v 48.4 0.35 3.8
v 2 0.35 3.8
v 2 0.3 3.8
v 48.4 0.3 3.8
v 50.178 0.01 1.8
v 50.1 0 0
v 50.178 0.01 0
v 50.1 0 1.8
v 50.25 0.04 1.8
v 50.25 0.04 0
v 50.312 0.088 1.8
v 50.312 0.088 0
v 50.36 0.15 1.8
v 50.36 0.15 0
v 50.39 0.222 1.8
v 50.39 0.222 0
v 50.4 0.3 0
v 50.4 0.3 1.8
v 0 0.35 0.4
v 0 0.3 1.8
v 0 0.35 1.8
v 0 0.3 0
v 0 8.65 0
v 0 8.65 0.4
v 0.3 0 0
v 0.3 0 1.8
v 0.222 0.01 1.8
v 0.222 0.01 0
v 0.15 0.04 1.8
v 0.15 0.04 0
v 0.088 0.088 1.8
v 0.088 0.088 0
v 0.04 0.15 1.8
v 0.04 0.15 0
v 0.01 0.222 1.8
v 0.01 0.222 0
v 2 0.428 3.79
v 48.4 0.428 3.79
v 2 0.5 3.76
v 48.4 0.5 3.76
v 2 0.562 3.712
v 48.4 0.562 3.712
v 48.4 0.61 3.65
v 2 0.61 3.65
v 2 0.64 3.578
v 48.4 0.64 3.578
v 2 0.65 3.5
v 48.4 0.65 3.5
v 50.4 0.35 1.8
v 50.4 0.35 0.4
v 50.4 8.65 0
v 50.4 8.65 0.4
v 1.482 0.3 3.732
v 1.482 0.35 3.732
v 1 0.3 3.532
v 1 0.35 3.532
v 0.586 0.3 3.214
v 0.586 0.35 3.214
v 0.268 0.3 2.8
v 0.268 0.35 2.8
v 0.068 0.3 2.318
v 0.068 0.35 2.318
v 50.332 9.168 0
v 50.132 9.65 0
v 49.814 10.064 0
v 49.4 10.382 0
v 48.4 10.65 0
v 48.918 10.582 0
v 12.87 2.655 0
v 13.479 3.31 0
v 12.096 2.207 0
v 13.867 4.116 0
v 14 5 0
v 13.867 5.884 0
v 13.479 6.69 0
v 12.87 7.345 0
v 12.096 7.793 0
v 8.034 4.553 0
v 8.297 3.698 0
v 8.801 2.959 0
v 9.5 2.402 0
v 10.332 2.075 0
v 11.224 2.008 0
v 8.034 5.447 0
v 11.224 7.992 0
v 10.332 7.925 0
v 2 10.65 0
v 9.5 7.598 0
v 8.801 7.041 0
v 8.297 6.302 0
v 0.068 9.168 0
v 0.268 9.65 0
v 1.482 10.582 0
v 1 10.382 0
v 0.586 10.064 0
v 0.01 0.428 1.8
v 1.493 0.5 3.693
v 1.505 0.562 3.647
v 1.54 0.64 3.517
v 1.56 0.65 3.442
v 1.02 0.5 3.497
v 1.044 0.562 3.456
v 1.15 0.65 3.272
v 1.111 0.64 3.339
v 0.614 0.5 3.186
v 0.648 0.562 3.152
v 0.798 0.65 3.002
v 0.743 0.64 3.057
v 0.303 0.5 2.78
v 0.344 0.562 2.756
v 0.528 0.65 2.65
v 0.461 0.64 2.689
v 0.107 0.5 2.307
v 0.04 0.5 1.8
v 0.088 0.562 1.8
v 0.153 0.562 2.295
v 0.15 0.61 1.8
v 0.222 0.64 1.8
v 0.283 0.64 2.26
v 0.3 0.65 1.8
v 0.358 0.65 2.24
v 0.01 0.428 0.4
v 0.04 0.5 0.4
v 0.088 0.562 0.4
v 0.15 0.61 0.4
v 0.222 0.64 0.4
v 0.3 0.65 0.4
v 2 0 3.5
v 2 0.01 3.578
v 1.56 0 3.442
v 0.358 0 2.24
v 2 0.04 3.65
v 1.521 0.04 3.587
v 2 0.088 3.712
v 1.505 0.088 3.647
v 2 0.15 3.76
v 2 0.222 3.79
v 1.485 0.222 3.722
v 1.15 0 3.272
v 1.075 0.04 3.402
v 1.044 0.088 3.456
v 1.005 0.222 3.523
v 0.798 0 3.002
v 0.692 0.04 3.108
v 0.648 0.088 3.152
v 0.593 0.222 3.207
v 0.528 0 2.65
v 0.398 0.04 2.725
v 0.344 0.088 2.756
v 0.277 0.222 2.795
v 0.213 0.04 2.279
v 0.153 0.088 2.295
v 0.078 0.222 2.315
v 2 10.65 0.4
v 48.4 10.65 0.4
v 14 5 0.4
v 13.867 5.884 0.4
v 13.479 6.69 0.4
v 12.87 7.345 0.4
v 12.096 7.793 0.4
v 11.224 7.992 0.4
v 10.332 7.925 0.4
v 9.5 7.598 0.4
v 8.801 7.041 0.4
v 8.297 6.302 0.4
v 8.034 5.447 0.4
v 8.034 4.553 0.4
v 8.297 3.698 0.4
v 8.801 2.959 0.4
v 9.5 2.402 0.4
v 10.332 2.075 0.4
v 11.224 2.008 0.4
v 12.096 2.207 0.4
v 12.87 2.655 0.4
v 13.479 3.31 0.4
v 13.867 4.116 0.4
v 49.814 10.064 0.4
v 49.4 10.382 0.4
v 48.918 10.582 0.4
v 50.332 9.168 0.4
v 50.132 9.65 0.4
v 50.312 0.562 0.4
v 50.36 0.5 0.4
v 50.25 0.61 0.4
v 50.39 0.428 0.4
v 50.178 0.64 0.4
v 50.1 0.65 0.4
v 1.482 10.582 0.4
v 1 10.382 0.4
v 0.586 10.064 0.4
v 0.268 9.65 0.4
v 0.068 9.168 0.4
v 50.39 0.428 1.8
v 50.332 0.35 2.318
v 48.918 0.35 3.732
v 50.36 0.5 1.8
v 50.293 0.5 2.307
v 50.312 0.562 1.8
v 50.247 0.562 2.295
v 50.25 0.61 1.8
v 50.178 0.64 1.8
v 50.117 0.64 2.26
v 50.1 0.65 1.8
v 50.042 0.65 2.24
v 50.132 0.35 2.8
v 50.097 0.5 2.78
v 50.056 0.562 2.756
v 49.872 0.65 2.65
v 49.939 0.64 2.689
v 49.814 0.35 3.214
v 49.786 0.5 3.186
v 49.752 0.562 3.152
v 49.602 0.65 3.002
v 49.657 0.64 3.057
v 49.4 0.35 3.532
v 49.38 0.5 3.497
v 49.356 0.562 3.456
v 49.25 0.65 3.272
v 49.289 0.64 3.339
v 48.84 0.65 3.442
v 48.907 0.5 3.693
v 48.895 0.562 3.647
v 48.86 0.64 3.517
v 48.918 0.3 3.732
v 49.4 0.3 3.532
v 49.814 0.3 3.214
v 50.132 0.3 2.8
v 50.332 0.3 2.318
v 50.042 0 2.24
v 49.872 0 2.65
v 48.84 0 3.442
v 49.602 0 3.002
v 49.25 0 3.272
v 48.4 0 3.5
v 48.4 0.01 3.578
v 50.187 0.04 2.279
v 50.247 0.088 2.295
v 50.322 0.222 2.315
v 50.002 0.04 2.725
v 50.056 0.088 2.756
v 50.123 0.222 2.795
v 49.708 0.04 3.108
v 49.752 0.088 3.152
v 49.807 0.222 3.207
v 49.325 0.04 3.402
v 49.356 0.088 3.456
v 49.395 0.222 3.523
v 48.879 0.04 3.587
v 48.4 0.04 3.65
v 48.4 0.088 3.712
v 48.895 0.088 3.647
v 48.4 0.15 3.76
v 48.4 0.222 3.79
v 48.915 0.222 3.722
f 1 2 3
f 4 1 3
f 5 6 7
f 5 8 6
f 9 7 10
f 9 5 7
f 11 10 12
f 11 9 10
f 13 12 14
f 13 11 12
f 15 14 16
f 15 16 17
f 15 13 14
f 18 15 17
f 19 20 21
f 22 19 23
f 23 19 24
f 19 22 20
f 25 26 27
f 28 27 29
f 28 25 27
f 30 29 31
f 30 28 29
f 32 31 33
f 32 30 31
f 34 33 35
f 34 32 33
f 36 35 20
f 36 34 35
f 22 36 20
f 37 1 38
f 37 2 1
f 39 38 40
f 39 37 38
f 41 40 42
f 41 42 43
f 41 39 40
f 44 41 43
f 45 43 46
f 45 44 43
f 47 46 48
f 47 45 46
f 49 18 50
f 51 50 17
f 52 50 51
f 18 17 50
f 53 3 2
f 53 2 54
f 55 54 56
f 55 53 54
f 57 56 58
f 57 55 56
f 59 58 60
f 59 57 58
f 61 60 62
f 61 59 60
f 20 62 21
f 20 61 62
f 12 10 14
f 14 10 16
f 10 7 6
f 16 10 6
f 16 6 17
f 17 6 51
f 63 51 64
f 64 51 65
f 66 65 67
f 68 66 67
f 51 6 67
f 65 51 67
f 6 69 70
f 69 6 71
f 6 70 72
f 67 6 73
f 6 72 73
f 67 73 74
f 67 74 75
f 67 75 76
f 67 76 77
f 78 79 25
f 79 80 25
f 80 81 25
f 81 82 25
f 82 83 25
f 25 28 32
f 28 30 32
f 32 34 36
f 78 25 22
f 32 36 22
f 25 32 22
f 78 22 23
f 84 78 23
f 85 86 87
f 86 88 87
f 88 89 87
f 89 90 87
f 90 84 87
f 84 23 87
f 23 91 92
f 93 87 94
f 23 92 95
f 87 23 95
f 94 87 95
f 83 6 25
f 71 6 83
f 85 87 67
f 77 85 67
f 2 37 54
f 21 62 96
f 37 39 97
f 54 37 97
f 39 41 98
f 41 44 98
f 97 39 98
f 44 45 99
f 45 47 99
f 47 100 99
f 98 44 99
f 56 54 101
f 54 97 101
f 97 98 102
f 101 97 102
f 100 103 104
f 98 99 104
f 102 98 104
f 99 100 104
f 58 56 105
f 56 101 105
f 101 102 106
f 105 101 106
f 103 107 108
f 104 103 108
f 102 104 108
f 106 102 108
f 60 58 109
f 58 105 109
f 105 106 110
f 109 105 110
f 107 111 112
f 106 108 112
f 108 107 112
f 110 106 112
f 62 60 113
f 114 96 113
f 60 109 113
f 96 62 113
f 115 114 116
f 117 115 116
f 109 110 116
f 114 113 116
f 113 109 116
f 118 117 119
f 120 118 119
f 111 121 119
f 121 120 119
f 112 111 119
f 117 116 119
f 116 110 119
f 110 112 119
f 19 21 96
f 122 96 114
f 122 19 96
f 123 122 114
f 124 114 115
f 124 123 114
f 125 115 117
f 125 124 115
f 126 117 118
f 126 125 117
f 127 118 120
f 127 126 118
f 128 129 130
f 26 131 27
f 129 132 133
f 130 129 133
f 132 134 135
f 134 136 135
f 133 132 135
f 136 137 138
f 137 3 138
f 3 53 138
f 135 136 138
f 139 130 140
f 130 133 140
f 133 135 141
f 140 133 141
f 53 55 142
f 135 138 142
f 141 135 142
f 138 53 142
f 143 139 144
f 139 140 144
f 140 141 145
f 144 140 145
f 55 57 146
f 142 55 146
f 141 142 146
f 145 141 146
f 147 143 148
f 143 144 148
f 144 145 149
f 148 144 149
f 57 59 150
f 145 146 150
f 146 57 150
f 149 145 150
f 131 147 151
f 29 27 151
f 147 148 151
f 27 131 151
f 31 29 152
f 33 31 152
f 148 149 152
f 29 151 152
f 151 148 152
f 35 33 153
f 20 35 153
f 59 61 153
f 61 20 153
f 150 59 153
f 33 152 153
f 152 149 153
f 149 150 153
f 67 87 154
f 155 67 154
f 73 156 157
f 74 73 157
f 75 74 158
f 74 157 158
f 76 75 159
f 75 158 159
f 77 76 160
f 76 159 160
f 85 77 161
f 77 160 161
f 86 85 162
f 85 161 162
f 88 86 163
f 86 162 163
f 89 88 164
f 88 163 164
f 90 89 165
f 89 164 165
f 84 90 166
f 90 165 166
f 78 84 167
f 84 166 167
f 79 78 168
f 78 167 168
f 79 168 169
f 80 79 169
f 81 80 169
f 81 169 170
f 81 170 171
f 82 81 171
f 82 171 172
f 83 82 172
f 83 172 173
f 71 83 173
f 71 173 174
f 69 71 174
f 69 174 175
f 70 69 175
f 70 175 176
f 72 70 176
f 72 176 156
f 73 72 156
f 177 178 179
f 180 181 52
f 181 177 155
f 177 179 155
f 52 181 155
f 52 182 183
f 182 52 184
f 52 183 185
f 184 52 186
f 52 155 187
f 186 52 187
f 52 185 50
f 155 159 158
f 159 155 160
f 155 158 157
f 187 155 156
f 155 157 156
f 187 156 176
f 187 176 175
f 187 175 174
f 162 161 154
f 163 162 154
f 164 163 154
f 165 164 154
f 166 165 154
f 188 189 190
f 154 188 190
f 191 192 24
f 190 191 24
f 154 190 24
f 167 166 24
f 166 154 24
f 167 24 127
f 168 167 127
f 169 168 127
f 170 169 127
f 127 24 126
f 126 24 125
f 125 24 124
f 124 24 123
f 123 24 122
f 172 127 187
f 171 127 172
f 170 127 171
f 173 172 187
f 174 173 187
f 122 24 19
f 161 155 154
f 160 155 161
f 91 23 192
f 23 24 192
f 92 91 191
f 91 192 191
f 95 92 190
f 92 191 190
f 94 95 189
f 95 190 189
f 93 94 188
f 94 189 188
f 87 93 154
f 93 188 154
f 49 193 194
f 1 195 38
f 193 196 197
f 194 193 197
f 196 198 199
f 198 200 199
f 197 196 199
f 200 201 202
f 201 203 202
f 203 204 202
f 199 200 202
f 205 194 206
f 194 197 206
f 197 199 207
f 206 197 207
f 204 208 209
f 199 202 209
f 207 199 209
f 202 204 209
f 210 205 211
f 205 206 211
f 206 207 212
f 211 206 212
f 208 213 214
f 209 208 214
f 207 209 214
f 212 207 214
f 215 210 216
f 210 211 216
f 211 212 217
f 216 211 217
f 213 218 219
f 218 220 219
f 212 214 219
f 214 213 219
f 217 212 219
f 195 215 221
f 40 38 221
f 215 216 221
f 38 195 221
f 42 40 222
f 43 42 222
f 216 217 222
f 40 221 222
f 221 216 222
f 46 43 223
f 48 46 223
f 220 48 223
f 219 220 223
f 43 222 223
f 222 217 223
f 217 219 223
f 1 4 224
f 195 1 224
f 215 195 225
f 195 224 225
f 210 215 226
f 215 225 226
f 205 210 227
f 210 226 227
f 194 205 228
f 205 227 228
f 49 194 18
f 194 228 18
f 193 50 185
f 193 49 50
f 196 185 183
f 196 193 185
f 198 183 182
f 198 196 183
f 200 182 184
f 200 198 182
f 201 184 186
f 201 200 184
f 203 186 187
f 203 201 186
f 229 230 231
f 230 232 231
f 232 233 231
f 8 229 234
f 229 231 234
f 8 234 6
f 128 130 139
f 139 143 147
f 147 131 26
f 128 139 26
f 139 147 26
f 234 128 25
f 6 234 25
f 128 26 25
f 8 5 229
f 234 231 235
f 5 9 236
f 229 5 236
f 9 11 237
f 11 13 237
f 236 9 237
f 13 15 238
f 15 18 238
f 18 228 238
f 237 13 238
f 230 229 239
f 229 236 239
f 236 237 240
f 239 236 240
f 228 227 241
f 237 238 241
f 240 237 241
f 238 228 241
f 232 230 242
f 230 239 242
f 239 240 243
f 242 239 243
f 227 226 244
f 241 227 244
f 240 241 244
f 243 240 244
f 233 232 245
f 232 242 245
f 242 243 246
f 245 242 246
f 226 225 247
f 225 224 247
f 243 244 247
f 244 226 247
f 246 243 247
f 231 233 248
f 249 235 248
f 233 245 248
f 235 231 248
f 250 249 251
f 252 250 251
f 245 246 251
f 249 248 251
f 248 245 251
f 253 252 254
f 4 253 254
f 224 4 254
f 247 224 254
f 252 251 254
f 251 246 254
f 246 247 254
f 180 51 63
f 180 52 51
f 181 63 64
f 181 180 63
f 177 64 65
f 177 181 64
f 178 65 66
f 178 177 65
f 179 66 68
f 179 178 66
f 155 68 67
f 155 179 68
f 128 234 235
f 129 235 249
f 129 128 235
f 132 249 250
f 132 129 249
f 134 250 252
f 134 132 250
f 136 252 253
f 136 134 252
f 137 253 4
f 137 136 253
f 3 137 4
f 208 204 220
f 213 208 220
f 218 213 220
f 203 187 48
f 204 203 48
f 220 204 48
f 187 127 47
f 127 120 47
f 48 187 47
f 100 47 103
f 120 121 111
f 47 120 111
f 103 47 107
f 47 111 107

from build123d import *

# Parameters (mm, degrees)
F1_DEPTH = 50.4
F2_R     = 3
F3_DEPTH = 0.401
F4_R     = 2
F5_R     = 0.3


with BuildPart() as f1:
    # F0 (on Right) → F1 (new body)
    with BuildSketch(Plane.YZ):
        Polygon((0, 3.8), (0, 0), (10.65, 0), (10.65, 0.4), (0.65, 0.4), (0.65, 3.8), align=None)
    extrude(amount=F1_DEPTH)

    # F2 (on face) → F3 (cut, through all)
    with BuildSketch(Plane.XY.offset(0.4)):
        with Locations((11, 5)):
            Circle(F2_R)
    extrude(amount=-F3_DEPTH, mode=Mode.SUBTRACT)

    # F4
    f4_edges = [f1.edges().sort_by_distance(p)[0] for p in [
        (0, 10.65, 0.2),
        (50.4, 10.65, 0.2),
        (50.4, 0.325, 3.8),
        (0, 0.325, 3.8),
    ]]
    fillet(f4_edges, radius=F4_R)

    # F5
    f5_edges = [f1.edges().sort_by_distance(p)[0] for p in [
        (0.585786, 0, 3.214214),
        (49.814214, 0, 3.214214),
        (50.4, 0.65, 1.1),
        (0, 0.65, 1.1),
    ]]
    fillet(f5_edges, radius=F5_R)


solid = f1.part
